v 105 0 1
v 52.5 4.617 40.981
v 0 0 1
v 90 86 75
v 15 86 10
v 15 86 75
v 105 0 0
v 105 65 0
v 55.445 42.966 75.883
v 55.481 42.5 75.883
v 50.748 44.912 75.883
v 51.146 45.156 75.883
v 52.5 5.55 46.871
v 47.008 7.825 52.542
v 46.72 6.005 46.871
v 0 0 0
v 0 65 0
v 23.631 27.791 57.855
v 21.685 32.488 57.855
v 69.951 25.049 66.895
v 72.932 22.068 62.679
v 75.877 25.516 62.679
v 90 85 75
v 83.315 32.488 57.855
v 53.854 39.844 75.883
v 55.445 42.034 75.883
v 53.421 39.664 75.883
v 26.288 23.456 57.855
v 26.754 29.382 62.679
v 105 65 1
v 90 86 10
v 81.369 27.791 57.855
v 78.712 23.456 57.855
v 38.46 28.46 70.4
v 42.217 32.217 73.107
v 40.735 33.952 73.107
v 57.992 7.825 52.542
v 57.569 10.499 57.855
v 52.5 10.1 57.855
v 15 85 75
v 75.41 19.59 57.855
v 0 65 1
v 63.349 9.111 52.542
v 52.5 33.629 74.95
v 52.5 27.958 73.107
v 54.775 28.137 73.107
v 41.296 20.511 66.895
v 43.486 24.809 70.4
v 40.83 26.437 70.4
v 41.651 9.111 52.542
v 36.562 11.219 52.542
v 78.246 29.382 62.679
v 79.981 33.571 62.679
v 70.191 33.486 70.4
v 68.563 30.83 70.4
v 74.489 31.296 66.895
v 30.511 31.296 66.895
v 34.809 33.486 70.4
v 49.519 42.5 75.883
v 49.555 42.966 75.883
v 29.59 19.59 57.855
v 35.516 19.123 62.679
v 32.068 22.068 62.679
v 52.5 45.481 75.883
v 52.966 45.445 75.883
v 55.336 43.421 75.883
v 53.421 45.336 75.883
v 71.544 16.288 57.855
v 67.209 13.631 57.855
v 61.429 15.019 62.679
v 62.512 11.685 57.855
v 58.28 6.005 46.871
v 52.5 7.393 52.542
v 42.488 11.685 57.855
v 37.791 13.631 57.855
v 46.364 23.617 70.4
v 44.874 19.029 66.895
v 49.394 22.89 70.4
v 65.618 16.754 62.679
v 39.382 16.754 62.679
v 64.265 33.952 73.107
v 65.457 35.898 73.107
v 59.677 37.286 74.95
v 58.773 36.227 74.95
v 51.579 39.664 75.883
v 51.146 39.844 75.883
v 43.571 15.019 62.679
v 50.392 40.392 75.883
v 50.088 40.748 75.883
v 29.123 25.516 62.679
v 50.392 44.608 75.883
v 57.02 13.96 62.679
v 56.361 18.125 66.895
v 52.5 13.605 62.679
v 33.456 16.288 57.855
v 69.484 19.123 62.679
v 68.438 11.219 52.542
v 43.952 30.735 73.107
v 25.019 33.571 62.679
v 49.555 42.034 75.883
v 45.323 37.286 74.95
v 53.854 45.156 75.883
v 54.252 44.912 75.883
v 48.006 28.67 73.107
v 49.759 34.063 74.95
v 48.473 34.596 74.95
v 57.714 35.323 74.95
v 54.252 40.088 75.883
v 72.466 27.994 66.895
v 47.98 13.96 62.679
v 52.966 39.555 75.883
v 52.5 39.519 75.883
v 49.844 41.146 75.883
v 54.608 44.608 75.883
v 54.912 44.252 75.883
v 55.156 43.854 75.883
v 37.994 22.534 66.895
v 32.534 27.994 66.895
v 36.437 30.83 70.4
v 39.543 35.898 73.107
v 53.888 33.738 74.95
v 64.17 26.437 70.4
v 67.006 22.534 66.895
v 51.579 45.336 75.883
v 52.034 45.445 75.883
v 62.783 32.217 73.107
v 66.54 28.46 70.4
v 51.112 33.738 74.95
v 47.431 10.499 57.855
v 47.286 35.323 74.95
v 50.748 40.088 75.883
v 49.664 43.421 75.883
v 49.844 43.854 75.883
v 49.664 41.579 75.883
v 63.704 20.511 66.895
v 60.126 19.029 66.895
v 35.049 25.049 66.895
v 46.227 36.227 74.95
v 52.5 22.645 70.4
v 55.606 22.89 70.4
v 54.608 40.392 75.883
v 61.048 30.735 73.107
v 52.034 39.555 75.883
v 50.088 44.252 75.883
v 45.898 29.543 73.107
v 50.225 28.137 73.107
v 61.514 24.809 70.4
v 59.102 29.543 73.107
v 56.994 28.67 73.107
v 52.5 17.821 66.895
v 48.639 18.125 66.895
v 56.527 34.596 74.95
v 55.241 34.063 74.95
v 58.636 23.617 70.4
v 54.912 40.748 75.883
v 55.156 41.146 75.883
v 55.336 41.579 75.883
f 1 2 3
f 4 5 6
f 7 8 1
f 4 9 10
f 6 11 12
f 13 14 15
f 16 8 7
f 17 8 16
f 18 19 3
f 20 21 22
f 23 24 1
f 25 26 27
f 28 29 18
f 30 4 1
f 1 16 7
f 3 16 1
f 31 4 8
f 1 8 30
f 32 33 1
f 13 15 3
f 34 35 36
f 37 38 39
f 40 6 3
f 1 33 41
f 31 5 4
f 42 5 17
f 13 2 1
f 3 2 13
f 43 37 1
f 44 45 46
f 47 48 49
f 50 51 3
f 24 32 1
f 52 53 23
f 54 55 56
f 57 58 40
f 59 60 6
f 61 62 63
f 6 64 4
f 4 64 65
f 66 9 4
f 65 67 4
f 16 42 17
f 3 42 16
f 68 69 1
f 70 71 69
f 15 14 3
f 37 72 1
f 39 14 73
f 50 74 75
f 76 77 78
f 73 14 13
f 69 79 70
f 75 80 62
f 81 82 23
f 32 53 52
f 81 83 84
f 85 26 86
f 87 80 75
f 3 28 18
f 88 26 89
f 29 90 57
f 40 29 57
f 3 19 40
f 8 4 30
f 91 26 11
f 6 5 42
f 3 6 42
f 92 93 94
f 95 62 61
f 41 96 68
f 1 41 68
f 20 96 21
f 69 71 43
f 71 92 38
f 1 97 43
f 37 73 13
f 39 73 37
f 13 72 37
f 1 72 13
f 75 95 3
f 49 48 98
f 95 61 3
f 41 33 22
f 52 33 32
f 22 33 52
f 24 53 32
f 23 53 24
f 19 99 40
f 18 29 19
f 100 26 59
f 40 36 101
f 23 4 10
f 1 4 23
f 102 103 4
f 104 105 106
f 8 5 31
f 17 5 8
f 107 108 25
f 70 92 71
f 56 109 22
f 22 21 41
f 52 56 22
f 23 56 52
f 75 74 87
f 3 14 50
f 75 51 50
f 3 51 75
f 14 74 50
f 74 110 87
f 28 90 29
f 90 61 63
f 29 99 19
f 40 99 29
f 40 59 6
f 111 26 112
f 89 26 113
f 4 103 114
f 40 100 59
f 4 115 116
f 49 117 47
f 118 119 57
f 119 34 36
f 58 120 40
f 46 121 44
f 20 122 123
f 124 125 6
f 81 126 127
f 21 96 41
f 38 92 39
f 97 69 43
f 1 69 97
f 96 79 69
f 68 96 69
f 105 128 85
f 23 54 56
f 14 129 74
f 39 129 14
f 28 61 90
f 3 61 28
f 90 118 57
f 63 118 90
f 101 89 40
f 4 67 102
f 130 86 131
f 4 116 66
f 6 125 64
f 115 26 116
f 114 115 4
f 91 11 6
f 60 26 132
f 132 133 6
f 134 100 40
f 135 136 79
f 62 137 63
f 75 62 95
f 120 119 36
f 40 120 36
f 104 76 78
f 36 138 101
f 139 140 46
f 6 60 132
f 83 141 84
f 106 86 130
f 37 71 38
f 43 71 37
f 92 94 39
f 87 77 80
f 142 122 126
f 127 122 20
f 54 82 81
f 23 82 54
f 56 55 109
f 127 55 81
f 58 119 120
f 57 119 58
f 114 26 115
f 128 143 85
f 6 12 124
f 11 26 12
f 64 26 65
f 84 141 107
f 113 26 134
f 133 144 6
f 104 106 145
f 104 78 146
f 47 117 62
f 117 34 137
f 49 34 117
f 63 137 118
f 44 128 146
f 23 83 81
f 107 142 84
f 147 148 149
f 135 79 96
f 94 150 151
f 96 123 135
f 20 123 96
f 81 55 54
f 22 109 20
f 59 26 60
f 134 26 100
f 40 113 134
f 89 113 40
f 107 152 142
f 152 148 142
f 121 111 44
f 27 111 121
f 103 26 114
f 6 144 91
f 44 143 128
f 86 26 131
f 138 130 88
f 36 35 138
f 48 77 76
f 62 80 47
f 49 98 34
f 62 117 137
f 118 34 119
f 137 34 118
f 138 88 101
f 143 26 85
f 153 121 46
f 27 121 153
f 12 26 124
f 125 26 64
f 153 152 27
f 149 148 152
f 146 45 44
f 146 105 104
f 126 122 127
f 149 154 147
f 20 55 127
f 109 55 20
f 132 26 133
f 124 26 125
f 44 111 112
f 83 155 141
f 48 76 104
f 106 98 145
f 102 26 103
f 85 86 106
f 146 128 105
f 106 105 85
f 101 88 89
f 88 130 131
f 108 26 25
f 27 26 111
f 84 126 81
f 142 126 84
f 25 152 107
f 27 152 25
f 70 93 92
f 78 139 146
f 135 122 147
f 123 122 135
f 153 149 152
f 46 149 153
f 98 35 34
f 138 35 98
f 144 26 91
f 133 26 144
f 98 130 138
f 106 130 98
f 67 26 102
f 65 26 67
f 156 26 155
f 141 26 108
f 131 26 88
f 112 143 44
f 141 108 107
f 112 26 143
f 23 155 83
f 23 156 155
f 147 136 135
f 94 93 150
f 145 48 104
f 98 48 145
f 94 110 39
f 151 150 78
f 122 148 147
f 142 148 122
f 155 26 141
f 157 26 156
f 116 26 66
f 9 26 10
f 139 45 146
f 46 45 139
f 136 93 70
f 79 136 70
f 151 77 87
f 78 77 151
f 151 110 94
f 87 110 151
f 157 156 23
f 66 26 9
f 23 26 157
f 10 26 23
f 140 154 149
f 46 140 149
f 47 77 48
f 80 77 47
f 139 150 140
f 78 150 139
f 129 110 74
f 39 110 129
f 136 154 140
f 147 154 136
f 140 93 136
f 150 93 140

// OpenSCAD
// file: pipe.scad
// Function to create a rectangular frame with Z-height
module rectangular_frame(outer_width, outer_height, frame_width, z_height) {
    // Calculate inner dimensions
    inner_width = outer_width - 2 * frame_width;
    inner_height = outer_height - 2 * frame_width;

    // Extrude the 2D frame into 3D
    linear_extrude(height = z_height) {
        difference() {
            square([outer_width, outer_height]);
            translate([frame_width, frame_width])
                square([inner_width, inner_height]);
        }
    }
}

module rounded_rect(width, height, corner_radius, extrude_height) {
    linear_extrude(extrude_height)
    minkowski() {
        square([width - 2*corner_radius, height - 2*corner_radius], center=true);
        circle(r=corner_radius);
    }
}
    
// Example usage
//rectangular_frame(100, 60, 3, 10); // 100x60mm outer size, 3mm frame width, 5mm Z-height
// main file
// Include the rectangular_frame module
include <pipe.scad>;

// Define the hole size
incoming_hole_width = 100;
incoming_hole_height = 60;
outgoing_hole_width = 76;
outgoing_hole_height = 66;

margin = 1;
wall_thickness = 2; // Thickness of the rectangle around the hole
overlap_depth=10;
// Calculate outer dimensions
incoming_outer_width = margin + incoming_hole_width + 2 * wall_thickness;
incoming_outer_height = margin + incoming_hole_height + 2 * wall_thickness;

outgoing_inner_width = outgoing_hole_width - margin;
outgoing_inner_height = outgoing_hole_height - margin;
outgoing_inner_hole_width = outgoing_inner_width-wall_thickness*2;
outgoing_inner_hole_height = outgoing_inner_height-wall_thickness*2;
diameter = outgoing_hole_width;
length = diameter;

union() {
    hull()
    {
        cube([incoming_outer_width, incoming_outer_height, 1]);
        translate([incoming_outer_width/2, incoming_outer_height/2+overlap_depth, diameter/2])
            sphere(d=diameter, $fn=40);
    

    // translate([0,0, 130])
    // rotate([0, 90, 0])


        translate([incoming_outer_width/2-outgoing_inner_width/2, diameter+overlap_depth,overlap_depth])
        rotate([90, 0, 0])
            cube([outgoing_inner_width, outgoing_inner_height, 1]);
        translate([incoming_outer_width/2, incoming_outer_height/2+overlap_depth, diameter/2])
            sphere(d=diameter, $fn=40);

    }
}
